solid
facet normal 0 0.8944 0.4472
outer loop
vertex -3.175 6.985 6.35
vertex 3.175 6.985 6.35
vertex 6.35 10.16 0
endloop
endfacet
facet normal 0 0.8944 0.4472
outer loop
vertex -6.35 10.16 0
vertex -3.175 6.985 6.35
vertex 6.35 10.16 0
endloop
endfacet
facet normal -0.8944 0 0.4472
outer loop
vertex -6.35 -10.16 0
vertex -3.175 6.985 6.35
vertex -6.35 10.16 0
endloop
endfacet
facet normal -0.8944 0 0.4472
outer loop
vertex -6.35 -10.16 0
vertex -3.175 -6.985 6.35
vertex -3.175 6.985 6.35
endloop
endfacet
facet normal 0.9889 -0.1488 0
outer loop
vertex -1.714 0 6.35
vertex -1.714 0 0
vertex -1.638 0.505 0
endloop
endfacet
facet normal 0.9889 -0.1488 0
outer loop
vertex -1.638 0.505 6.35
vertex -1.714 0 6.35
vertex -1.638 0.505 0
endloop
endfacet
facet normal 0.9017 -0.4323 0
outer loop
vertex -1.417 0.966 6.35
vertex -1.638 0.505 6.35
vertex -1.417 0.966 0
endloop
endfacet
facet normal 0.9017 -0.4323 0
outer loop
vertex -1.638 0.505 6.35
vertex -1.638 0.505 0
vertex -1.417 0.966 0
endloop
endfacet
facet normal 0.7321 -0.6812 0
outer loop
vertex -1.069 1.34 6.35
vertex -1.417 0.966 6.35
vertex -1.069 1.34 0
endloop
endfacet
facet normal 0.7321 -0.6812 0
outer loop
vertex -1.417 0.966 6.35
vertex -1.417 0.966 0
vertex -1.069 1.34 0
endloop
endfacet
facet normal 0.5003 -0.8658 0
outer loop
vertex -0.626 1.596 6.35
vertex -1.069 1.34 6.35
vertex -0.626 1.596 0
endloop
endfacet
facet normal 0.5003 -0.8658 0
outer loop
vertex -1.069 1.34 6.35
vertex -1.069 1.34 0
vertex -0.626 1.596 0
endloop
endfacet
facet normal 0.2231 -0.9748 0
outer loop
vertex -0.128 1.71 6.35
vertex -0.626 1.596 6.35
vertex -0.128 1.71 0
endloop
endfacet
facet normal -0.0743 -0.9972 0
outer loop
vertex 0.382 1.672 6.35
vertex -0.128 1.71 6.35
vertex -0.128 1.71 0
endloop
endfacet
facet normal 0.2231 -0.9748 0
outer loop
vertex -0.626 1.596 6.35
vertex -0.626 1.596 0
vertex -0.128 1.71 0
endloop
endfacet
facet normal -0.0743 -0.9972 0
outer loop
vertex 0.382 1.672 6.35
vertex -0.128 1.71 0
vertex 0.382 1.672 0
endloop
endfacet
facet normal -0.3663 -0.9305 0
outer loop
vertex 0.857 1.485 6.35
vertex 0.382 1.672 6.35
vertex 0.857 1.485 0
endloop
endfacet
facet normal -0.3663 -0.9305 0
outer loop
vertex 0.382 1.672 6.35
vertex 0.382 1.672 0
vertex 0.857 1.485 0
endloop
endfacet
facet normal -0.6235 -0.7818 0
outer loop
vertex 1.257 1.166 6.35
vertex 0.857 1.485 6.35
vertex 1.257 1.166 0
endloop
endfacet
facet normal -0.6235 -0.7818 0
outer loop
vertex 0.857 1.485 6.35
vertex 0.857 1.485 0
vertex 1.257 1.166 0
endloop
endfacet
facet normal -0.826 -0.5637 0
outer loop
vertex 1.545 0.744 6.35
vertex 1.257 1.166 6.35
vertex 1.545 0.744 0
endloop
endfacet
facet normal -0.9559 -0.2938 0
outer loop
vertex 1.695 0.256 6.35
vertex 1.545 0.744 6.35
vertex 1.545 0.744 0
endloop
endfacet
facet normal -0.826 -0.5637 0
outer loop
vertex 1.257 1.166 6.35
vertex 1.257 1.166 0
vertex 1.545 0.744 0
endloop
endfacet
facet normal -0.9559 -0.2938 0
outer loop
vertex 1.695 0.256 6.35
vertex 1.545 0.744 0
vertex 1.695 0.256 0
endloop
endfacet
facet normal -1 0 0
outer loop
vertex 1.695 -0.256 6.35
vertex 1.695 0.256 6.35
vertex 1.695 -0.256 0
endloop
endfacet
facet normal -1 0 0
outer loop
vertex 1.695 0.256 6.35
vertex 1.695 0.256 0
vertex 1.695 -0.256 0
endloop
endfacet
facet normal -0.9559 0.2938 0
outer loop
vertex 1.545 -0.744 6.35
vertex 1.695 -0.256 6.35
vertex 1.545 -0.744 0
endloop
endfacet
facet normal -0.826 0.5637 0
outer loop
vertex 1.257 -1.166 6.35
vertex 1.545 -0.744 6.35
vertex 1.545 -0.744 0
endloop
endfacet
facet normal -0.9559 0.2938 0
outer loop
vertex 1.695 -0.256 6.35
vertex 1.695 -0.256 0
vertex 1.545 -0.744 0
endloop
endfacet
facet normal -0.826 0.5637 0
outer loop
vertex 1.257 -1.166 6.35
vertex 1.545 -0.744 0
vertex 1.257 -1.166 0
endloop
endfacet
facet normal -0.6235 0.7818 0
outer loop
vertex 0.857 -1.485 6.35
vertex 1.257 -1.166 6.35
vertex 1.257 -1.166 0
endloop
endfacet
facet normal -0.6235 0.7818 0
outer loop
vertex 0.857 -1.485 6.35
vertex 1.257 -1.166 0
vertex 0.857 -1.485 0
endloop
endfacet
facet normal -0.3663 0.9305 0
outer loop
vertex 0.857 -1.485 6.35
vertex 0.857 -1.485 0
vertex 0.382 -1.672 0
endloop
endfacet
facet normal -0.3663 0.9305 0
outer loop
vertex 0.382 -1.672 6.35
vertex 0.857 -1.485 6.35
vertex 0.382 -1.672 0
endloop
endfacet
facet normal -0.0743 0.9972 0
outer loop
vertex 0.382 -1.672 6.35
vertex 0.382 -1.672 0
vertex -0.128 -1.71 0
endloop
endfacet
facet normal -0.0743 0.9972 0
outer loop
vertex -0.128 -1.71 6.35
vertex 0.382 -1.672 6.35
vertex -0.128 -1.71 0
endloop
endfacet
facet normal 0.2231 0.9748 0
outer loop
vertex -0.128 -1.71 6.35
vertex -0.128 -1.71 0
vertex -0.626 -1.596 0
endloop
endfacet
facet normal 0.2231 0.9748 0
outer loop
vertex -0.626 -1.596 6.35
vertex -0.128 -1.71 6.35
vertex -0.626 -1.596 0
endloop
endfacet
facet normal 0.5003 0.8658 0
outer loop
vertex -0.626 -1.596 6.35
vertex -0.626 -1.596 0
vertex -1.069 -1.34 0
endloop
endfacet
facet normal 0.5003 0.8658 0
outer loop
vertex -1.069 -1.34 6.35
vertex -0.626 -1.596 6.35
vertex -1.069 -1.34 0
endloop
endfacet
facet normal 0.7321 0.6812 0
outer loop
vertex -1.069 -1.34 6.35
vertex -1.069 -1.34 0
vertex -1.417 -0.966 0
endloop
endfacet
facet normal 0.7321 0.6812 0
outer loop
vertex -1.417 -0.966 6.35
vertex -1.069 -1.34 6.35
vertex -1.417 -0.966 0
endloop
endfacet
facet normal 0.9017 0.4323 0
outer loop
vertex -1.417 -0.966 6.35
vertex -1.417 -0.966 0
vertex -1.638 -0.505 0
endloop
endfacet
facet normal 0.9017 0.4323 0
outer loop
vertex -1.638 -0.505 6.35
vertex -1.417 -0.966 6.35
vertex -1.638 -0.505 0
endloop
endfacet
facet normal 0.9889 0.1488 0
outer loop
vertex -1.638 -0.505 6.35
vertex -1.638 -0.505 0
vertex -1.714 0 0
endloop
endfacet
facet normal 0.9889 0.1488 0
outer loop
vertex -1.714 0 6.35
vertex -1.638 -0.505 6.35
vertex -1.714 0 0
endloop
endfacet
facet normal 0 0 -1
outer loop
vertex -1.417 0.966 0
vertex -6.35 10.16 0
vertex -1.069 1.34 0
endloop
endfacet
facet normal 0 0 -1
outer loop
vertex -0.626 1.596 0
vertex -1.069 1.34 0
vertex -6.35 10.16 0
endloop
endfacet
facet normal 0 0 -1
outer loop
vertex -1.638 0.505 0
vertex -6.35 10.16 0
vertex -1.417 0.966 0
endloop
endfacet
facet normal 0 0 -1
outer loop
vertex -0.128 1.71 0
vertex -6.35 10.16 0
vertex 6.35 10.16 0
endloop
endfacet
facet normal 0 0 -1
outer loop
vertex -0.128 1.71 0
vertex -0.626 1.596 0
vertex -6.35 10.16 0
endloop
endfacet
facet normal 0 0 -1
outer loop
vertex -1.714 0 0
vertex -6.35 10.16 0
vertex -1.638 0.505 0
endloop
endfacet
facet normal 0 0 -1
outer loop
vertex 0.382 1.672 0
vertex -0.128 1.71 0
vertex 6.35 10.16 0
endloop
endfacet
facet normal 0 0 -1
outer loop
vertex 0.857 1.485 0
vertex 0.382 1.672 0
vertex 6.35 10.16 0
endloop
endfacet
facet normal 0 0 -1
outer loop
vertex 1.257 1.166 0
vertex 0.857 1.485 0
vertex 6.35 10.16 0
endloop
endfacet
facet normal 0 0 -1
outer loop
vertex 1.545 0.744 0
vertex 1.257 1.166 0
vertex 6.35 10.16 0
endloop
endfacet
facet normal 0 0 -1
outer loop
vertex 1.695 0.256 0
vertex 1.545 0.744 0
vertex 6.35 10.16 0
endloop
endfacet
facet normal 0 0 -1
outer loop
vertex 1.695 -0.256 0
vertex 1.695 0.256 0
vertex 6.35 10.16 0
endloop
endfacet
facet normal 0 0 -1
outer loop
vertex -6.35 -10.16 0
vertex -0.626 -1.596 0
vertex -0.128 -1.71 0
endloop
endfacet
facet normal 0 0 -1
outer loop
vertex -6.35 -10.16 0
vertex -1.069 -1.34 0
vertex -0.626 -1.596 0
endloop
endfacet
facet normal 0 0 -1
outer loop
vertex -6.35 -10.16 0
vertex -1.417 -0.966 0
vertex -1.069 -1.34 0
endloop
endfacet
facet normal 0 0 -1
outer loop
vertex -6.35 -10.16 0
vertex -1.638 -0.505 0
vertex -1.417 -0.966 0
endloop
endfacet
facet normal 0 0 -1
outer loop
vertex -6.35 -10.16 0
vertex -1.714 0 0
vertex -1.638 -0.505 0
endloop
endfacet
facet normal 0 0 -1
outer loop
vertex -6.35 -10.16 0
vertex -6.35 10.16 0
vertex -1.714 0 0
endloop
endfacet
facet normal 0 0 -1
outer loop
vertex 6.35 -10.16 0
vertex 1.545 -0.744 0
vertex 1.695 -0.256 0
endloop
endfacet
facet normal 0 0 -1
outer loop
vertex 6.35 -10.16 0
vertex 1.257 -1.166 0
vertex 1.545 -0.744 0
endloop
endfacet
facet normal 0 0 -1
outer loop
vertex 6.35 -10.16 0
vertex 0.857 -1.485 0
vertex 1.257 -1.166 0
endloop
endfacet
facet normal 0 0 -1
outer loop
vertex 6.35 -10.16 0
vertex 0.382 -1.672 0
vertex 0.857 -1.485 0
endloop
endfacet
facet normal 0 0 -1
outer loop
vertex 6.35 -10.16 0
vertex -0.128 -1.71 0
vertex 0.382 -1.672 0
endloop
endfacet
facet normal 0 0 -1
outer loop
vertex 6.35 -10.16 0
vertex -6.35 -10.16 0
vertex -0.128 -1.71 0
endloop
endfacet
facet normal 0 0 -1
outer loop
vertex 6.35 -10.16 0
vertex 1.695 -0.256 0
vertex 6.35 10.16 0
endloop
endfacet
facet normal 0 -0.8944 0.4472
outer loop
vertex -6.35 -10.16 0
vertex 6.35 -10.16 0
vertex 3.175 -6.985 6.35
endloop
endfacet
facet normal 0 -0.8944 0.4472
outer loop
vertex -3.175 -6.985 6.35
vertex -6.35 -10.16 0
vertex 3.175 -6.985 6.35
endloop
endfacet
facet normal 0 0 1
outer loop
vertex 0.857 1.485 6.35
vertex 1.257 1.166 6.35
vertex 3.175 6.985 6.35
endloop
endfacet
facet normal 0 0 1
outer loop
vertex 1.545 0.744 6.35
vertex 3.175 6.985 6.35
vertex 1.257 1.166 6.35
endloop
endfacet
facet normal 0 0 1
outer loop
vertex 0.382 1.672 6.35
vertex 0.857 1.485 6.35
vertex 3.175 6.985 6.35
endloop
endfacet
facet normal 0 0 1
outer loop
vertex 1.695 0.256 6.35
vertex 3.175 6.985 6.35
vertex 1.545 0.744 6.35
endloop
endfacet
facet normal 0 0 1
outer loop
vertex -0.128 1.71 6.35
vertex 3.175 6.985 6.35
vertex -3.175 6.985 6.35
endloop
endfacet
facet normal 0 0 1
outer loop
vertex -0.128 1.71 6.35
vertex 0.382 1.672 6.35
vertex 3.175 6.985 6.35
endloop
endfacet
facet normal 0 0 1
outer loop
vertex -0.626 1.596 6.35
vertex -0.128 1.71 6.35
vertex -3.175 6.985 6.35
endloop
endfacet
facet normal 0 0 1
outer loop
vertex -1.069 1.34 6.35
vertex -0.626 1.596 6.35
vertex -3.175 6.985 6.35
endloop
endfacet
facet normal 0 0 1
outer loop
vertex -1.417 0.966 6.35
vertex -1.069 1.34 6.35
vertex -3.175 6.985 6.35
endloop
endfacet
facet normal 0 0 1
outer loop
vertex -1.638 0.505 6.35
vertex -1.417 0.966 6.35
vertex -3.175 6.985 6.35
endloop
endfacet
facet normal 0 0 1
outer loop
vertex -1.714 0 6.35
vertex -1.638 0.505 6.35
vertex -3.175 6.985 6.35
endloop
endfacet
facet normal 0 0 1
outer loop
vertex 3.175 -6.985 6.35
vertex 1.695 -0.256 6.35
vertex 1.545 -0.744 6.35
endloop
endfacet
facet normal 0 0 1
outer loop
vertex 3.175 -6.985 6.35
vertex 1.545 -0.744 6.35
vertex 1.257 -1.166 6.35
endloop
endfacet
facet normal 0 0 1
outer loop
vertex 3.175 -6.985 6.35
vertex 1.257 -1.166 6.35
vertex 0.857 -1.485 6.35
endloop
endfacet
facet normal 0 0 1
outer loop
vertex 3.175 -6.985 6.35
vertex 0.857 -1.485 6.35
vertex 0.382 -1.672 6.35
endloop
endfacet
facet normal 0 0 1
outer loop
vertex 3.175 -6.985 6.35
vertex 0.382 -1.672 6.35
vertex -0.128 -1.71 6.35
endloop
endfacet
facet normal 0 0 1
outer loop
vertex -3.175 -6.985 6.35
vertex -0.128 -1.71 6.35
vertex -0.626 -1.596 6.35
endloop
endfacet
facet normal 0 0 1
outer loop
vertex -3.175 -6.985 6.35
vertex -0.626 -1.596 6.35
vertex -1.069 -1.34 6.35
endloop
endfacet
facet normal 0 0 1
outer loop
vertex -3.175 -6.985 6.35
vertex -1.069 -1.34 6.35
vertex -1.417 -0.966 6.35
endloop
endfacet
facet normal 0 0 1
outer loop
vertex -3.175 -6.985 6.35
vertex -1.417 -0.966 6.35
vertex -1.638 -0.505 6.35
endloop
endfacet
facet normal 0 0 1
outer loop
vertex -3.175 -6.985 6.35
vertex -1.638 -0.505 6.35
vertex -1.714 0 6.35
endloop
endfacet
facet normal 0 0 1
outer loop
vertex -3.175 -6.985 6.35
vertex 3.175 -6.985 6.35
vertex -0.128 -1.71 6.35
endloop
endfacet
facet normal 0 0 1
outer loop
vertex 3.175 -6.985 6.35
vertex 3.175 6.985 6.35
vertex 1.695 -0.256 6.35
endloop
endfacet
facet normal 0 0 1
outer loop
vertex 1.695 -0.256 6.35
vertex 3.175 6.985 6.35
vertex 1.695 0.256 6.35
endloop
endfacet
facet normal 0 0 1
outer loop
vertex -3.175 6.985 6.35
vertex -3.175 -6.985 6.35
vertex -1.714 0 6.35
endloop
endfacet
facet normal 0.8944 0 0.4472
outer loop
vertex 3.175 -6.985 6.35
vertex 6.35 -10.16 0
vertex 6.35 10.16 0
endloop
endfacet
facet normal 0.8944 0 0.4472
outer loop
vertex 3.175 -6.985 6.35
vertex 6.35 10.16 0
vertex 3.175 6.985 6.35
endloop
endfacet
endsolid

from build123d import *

# Parameters (mm, degrees)
F1_DEPTH = 10.16
F3_DEPTH = 12.7
F5_D     = 3.429


with BuildPart() as f1:
    # F0 (on Front) → F1 (new body, symmetric)
    with BuildSketch(Plane.XZ):
        Polygon((0, 6.35), (-3.175, 6.35), (-6.35, 0), (0, 0), (6.35, 0), (3.175, 6.35), align=None)
    extrude(amount=F1_DEPTH, both=True)

    # F2 (on Right) → F3 (cut, symmetric)
    with BuildSketch(Plane.YZ):
        Polygon((-10.16, 6.35), (-10.16, 0), (-6.985, 6.35), align=None)
        Polygon((6.985, 6.35), (10.16, 0), (10.16, 6.35), align=None)
    extrude(amount=F3_DEPTH, both=True, mode=Mode.SUBTRACT)

    # F5 (through all)
    with Locations(Plane.XY.offset(6.35)):
        with Locations((0, 0)):
            Hole(F5_D / 2)


solid = f1.part
